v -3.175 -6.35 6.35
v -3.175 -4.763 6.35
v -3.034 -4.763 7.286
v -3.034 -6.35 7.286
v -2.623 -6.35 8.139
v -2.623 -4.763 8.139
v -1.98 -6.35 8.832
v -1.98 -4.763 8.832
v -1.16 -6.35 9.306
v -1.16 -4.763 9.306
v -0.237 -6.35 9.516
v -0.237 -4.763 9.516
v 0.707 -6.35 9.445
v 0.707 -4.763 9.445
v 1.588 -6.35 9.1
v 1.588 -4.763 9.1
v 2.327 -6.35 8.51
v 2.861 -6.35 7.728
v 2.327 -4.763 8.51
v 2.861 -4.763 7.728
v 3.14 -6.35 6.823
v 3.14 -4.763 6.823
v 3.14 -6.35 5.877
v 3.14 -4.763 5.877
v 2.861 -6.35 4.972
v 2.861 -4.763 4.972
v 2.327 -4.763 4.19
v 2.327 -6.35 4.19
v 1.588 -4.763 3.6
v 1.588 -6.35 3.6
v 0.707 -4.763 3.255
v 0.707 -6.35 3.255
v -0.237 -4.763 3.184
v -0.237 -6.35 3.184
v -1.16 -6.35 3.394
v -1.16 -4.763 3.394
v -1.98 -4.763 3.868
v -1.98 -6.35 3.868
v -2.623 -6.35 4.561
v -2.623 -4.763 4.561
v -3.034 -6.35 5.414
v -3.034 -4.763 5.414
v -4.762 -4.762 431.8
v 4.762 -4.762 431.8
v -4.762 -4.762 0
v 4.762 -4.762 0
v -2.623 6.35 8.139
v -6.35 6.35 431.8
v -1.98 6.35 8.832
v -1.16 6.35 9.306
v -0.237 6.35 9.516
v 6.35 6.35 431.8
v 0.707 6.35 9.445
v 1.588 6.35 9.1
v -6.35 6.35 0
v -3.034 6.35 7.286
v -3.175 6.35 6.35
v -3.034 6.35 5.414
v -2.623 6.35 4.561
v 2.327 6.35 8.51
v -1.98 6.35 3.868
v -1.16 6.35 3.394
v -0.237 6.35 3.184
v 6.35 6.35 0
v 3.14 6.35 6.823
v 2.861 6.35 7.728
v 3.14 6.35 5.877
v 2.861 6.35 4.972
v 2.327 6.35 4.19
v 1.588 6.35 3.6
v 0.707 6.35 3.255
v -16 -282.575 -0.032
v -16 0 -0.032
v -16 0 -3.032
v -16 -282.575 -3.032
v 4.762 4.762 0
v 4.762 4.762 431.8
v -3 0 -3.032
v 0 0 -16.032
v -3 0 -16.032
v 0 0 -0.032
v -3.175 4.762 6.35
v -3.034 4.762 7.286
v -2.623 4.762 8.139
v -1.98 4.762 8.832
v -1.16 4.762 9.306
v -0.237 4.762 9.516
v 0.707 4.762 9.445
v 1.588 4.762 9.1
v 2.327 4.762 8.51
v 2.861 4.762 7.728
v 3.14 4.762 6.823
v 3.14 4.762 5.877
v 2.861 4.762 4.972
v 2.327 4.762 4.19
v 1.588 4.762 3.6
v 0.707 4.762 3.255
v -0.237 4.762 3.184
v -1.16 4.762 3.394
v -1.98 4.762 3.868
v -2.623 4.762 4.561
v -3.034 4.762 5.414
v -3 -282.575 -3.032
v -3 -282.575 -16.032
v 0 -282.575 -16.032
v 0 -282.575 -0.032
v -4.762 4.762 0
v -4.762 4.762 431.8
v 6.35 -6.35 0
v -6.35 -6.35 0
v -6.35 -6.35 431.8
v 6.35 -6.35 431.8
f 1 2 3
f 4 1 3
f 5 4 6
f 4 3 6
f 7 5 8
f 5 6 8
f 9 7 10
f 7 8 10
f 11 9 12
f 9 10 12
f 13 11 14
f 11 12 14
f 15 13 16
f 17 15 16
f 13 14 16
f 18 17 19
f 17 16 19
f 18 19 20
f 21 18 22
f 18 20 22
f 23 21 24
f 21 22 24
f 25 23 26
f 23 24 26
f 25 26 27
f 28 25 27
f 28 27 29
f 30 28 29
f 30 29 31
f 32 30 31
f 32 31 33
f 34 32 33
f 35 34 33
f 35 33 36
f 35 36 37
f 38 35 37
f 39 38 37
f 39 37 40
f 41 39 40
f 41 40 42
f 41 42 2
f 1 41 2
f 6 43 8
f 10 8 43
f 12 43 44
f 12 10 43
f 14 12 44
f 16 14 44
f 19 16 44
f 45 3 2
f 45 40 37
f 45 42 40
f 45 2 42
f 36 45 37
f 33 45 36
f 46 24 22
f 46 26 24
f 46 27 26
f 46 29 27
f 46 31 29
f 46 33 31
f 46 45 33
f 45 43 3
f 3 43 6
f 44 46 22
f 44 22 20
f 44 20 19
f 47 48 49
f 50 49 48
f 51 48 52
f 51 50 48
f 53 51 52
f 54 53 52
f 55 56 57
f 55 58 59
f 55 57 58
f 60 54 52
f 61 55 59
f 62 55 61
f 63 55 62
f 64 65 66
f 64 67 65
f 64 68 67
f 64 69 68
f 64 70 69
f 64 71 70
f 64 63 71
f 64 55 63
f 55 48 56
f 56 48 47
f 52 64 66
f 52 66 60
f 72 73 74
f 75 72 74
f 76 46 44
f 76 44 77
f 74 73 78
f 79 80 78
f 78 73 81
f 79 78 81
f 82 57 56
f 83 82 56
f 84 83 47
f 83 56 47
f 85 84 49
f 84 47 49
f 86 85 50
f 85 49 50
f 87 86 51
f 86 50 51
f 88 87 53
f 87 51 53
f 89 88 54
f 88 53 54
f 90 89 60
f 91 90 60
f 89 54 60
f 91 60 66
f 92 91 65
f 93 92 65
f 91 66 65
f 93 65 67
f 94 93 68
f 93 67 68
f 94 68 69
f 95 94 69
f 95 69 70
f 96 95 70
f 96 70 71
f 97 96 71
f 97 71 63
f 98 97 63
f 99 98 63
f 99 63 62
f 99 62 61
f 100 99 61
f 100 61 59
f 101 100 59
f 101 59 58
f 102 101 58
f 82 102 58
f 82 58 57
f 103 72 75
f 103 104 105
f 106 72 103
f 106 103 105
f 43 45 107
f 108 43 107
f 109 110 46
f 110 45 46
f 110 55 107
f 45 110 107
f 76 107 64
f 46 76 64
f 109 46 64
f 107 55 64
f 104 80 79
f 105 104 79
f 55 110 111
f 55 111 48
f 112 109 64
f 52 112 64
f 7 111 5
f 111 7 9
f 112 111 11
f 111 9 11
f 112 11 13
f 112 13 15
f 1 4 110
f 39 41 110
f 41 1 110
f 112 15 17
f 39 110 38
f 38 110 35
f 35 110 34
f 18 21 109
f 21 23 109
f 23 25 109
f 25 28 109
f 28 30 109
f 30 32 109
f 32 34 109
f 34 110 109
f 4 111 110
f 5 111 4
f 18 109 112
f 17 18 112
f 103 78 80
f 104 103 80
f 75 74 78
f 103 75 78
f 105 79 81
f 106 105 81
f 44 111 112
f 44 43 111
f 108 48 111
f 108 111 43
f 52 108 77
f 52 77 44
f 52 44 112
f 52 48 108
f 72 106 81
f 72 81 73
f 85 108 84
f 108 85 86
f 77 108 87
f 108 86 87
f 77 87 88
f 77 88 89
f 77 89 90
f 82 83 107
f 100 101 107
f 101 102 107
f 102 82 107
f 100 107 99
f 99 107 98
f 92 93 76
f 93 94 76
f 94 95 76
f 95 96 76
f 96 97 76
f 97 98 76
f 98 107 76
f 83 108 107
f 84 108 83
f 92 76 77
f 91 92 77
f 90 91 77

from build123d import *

# Parameters (mm, degrees)
F0_W     = 12.7
F0_H     = 12.7
F0_W_2   = 9.525
F0_H_2   = 9.525
F1_DEPTH = 431.8
F2_R     = 3.175
F3_DEPTH = 12.701
F5_DEPTH = 282.575


with BuildPart() as f1:
    # F0 (on Top) → F1 (new body)
    with BuildSketch(Plane.XY):
        Rectangle(F0_W, F0_H)
        Rectangle(F0_W_2, F0_H_2, mode=Mode.SUBTRACT)
    extrude(amount=F1_DEPTH)

    # F2 (on face) → F3 (cut, through all)
    with BuildSketch(Plane(origin=(0, 6.35, 0), x_dir=(-1, 0, 0), z_dir=(0, 1, 0))):
        with Locations((0, 6.35)):
            Circle(F2_R)
    extrude(amount=-F3_DEPTH, mode=Mode.SUBTRACT)


with BuildPart() as f5:
    # F4 (on Front) → F5 (new body)
    with BuildSketch(Plane.XZ):
        Polygon((0, -16.032034), (0, -0.032034), (-16, -0.032034), (-16, -3.032034), (-3, -3.032034), (-3, -16.032034), align=None)
    extrude(amount=F5_DEPTH)


solid = Compound([f1.part, f5.part])
